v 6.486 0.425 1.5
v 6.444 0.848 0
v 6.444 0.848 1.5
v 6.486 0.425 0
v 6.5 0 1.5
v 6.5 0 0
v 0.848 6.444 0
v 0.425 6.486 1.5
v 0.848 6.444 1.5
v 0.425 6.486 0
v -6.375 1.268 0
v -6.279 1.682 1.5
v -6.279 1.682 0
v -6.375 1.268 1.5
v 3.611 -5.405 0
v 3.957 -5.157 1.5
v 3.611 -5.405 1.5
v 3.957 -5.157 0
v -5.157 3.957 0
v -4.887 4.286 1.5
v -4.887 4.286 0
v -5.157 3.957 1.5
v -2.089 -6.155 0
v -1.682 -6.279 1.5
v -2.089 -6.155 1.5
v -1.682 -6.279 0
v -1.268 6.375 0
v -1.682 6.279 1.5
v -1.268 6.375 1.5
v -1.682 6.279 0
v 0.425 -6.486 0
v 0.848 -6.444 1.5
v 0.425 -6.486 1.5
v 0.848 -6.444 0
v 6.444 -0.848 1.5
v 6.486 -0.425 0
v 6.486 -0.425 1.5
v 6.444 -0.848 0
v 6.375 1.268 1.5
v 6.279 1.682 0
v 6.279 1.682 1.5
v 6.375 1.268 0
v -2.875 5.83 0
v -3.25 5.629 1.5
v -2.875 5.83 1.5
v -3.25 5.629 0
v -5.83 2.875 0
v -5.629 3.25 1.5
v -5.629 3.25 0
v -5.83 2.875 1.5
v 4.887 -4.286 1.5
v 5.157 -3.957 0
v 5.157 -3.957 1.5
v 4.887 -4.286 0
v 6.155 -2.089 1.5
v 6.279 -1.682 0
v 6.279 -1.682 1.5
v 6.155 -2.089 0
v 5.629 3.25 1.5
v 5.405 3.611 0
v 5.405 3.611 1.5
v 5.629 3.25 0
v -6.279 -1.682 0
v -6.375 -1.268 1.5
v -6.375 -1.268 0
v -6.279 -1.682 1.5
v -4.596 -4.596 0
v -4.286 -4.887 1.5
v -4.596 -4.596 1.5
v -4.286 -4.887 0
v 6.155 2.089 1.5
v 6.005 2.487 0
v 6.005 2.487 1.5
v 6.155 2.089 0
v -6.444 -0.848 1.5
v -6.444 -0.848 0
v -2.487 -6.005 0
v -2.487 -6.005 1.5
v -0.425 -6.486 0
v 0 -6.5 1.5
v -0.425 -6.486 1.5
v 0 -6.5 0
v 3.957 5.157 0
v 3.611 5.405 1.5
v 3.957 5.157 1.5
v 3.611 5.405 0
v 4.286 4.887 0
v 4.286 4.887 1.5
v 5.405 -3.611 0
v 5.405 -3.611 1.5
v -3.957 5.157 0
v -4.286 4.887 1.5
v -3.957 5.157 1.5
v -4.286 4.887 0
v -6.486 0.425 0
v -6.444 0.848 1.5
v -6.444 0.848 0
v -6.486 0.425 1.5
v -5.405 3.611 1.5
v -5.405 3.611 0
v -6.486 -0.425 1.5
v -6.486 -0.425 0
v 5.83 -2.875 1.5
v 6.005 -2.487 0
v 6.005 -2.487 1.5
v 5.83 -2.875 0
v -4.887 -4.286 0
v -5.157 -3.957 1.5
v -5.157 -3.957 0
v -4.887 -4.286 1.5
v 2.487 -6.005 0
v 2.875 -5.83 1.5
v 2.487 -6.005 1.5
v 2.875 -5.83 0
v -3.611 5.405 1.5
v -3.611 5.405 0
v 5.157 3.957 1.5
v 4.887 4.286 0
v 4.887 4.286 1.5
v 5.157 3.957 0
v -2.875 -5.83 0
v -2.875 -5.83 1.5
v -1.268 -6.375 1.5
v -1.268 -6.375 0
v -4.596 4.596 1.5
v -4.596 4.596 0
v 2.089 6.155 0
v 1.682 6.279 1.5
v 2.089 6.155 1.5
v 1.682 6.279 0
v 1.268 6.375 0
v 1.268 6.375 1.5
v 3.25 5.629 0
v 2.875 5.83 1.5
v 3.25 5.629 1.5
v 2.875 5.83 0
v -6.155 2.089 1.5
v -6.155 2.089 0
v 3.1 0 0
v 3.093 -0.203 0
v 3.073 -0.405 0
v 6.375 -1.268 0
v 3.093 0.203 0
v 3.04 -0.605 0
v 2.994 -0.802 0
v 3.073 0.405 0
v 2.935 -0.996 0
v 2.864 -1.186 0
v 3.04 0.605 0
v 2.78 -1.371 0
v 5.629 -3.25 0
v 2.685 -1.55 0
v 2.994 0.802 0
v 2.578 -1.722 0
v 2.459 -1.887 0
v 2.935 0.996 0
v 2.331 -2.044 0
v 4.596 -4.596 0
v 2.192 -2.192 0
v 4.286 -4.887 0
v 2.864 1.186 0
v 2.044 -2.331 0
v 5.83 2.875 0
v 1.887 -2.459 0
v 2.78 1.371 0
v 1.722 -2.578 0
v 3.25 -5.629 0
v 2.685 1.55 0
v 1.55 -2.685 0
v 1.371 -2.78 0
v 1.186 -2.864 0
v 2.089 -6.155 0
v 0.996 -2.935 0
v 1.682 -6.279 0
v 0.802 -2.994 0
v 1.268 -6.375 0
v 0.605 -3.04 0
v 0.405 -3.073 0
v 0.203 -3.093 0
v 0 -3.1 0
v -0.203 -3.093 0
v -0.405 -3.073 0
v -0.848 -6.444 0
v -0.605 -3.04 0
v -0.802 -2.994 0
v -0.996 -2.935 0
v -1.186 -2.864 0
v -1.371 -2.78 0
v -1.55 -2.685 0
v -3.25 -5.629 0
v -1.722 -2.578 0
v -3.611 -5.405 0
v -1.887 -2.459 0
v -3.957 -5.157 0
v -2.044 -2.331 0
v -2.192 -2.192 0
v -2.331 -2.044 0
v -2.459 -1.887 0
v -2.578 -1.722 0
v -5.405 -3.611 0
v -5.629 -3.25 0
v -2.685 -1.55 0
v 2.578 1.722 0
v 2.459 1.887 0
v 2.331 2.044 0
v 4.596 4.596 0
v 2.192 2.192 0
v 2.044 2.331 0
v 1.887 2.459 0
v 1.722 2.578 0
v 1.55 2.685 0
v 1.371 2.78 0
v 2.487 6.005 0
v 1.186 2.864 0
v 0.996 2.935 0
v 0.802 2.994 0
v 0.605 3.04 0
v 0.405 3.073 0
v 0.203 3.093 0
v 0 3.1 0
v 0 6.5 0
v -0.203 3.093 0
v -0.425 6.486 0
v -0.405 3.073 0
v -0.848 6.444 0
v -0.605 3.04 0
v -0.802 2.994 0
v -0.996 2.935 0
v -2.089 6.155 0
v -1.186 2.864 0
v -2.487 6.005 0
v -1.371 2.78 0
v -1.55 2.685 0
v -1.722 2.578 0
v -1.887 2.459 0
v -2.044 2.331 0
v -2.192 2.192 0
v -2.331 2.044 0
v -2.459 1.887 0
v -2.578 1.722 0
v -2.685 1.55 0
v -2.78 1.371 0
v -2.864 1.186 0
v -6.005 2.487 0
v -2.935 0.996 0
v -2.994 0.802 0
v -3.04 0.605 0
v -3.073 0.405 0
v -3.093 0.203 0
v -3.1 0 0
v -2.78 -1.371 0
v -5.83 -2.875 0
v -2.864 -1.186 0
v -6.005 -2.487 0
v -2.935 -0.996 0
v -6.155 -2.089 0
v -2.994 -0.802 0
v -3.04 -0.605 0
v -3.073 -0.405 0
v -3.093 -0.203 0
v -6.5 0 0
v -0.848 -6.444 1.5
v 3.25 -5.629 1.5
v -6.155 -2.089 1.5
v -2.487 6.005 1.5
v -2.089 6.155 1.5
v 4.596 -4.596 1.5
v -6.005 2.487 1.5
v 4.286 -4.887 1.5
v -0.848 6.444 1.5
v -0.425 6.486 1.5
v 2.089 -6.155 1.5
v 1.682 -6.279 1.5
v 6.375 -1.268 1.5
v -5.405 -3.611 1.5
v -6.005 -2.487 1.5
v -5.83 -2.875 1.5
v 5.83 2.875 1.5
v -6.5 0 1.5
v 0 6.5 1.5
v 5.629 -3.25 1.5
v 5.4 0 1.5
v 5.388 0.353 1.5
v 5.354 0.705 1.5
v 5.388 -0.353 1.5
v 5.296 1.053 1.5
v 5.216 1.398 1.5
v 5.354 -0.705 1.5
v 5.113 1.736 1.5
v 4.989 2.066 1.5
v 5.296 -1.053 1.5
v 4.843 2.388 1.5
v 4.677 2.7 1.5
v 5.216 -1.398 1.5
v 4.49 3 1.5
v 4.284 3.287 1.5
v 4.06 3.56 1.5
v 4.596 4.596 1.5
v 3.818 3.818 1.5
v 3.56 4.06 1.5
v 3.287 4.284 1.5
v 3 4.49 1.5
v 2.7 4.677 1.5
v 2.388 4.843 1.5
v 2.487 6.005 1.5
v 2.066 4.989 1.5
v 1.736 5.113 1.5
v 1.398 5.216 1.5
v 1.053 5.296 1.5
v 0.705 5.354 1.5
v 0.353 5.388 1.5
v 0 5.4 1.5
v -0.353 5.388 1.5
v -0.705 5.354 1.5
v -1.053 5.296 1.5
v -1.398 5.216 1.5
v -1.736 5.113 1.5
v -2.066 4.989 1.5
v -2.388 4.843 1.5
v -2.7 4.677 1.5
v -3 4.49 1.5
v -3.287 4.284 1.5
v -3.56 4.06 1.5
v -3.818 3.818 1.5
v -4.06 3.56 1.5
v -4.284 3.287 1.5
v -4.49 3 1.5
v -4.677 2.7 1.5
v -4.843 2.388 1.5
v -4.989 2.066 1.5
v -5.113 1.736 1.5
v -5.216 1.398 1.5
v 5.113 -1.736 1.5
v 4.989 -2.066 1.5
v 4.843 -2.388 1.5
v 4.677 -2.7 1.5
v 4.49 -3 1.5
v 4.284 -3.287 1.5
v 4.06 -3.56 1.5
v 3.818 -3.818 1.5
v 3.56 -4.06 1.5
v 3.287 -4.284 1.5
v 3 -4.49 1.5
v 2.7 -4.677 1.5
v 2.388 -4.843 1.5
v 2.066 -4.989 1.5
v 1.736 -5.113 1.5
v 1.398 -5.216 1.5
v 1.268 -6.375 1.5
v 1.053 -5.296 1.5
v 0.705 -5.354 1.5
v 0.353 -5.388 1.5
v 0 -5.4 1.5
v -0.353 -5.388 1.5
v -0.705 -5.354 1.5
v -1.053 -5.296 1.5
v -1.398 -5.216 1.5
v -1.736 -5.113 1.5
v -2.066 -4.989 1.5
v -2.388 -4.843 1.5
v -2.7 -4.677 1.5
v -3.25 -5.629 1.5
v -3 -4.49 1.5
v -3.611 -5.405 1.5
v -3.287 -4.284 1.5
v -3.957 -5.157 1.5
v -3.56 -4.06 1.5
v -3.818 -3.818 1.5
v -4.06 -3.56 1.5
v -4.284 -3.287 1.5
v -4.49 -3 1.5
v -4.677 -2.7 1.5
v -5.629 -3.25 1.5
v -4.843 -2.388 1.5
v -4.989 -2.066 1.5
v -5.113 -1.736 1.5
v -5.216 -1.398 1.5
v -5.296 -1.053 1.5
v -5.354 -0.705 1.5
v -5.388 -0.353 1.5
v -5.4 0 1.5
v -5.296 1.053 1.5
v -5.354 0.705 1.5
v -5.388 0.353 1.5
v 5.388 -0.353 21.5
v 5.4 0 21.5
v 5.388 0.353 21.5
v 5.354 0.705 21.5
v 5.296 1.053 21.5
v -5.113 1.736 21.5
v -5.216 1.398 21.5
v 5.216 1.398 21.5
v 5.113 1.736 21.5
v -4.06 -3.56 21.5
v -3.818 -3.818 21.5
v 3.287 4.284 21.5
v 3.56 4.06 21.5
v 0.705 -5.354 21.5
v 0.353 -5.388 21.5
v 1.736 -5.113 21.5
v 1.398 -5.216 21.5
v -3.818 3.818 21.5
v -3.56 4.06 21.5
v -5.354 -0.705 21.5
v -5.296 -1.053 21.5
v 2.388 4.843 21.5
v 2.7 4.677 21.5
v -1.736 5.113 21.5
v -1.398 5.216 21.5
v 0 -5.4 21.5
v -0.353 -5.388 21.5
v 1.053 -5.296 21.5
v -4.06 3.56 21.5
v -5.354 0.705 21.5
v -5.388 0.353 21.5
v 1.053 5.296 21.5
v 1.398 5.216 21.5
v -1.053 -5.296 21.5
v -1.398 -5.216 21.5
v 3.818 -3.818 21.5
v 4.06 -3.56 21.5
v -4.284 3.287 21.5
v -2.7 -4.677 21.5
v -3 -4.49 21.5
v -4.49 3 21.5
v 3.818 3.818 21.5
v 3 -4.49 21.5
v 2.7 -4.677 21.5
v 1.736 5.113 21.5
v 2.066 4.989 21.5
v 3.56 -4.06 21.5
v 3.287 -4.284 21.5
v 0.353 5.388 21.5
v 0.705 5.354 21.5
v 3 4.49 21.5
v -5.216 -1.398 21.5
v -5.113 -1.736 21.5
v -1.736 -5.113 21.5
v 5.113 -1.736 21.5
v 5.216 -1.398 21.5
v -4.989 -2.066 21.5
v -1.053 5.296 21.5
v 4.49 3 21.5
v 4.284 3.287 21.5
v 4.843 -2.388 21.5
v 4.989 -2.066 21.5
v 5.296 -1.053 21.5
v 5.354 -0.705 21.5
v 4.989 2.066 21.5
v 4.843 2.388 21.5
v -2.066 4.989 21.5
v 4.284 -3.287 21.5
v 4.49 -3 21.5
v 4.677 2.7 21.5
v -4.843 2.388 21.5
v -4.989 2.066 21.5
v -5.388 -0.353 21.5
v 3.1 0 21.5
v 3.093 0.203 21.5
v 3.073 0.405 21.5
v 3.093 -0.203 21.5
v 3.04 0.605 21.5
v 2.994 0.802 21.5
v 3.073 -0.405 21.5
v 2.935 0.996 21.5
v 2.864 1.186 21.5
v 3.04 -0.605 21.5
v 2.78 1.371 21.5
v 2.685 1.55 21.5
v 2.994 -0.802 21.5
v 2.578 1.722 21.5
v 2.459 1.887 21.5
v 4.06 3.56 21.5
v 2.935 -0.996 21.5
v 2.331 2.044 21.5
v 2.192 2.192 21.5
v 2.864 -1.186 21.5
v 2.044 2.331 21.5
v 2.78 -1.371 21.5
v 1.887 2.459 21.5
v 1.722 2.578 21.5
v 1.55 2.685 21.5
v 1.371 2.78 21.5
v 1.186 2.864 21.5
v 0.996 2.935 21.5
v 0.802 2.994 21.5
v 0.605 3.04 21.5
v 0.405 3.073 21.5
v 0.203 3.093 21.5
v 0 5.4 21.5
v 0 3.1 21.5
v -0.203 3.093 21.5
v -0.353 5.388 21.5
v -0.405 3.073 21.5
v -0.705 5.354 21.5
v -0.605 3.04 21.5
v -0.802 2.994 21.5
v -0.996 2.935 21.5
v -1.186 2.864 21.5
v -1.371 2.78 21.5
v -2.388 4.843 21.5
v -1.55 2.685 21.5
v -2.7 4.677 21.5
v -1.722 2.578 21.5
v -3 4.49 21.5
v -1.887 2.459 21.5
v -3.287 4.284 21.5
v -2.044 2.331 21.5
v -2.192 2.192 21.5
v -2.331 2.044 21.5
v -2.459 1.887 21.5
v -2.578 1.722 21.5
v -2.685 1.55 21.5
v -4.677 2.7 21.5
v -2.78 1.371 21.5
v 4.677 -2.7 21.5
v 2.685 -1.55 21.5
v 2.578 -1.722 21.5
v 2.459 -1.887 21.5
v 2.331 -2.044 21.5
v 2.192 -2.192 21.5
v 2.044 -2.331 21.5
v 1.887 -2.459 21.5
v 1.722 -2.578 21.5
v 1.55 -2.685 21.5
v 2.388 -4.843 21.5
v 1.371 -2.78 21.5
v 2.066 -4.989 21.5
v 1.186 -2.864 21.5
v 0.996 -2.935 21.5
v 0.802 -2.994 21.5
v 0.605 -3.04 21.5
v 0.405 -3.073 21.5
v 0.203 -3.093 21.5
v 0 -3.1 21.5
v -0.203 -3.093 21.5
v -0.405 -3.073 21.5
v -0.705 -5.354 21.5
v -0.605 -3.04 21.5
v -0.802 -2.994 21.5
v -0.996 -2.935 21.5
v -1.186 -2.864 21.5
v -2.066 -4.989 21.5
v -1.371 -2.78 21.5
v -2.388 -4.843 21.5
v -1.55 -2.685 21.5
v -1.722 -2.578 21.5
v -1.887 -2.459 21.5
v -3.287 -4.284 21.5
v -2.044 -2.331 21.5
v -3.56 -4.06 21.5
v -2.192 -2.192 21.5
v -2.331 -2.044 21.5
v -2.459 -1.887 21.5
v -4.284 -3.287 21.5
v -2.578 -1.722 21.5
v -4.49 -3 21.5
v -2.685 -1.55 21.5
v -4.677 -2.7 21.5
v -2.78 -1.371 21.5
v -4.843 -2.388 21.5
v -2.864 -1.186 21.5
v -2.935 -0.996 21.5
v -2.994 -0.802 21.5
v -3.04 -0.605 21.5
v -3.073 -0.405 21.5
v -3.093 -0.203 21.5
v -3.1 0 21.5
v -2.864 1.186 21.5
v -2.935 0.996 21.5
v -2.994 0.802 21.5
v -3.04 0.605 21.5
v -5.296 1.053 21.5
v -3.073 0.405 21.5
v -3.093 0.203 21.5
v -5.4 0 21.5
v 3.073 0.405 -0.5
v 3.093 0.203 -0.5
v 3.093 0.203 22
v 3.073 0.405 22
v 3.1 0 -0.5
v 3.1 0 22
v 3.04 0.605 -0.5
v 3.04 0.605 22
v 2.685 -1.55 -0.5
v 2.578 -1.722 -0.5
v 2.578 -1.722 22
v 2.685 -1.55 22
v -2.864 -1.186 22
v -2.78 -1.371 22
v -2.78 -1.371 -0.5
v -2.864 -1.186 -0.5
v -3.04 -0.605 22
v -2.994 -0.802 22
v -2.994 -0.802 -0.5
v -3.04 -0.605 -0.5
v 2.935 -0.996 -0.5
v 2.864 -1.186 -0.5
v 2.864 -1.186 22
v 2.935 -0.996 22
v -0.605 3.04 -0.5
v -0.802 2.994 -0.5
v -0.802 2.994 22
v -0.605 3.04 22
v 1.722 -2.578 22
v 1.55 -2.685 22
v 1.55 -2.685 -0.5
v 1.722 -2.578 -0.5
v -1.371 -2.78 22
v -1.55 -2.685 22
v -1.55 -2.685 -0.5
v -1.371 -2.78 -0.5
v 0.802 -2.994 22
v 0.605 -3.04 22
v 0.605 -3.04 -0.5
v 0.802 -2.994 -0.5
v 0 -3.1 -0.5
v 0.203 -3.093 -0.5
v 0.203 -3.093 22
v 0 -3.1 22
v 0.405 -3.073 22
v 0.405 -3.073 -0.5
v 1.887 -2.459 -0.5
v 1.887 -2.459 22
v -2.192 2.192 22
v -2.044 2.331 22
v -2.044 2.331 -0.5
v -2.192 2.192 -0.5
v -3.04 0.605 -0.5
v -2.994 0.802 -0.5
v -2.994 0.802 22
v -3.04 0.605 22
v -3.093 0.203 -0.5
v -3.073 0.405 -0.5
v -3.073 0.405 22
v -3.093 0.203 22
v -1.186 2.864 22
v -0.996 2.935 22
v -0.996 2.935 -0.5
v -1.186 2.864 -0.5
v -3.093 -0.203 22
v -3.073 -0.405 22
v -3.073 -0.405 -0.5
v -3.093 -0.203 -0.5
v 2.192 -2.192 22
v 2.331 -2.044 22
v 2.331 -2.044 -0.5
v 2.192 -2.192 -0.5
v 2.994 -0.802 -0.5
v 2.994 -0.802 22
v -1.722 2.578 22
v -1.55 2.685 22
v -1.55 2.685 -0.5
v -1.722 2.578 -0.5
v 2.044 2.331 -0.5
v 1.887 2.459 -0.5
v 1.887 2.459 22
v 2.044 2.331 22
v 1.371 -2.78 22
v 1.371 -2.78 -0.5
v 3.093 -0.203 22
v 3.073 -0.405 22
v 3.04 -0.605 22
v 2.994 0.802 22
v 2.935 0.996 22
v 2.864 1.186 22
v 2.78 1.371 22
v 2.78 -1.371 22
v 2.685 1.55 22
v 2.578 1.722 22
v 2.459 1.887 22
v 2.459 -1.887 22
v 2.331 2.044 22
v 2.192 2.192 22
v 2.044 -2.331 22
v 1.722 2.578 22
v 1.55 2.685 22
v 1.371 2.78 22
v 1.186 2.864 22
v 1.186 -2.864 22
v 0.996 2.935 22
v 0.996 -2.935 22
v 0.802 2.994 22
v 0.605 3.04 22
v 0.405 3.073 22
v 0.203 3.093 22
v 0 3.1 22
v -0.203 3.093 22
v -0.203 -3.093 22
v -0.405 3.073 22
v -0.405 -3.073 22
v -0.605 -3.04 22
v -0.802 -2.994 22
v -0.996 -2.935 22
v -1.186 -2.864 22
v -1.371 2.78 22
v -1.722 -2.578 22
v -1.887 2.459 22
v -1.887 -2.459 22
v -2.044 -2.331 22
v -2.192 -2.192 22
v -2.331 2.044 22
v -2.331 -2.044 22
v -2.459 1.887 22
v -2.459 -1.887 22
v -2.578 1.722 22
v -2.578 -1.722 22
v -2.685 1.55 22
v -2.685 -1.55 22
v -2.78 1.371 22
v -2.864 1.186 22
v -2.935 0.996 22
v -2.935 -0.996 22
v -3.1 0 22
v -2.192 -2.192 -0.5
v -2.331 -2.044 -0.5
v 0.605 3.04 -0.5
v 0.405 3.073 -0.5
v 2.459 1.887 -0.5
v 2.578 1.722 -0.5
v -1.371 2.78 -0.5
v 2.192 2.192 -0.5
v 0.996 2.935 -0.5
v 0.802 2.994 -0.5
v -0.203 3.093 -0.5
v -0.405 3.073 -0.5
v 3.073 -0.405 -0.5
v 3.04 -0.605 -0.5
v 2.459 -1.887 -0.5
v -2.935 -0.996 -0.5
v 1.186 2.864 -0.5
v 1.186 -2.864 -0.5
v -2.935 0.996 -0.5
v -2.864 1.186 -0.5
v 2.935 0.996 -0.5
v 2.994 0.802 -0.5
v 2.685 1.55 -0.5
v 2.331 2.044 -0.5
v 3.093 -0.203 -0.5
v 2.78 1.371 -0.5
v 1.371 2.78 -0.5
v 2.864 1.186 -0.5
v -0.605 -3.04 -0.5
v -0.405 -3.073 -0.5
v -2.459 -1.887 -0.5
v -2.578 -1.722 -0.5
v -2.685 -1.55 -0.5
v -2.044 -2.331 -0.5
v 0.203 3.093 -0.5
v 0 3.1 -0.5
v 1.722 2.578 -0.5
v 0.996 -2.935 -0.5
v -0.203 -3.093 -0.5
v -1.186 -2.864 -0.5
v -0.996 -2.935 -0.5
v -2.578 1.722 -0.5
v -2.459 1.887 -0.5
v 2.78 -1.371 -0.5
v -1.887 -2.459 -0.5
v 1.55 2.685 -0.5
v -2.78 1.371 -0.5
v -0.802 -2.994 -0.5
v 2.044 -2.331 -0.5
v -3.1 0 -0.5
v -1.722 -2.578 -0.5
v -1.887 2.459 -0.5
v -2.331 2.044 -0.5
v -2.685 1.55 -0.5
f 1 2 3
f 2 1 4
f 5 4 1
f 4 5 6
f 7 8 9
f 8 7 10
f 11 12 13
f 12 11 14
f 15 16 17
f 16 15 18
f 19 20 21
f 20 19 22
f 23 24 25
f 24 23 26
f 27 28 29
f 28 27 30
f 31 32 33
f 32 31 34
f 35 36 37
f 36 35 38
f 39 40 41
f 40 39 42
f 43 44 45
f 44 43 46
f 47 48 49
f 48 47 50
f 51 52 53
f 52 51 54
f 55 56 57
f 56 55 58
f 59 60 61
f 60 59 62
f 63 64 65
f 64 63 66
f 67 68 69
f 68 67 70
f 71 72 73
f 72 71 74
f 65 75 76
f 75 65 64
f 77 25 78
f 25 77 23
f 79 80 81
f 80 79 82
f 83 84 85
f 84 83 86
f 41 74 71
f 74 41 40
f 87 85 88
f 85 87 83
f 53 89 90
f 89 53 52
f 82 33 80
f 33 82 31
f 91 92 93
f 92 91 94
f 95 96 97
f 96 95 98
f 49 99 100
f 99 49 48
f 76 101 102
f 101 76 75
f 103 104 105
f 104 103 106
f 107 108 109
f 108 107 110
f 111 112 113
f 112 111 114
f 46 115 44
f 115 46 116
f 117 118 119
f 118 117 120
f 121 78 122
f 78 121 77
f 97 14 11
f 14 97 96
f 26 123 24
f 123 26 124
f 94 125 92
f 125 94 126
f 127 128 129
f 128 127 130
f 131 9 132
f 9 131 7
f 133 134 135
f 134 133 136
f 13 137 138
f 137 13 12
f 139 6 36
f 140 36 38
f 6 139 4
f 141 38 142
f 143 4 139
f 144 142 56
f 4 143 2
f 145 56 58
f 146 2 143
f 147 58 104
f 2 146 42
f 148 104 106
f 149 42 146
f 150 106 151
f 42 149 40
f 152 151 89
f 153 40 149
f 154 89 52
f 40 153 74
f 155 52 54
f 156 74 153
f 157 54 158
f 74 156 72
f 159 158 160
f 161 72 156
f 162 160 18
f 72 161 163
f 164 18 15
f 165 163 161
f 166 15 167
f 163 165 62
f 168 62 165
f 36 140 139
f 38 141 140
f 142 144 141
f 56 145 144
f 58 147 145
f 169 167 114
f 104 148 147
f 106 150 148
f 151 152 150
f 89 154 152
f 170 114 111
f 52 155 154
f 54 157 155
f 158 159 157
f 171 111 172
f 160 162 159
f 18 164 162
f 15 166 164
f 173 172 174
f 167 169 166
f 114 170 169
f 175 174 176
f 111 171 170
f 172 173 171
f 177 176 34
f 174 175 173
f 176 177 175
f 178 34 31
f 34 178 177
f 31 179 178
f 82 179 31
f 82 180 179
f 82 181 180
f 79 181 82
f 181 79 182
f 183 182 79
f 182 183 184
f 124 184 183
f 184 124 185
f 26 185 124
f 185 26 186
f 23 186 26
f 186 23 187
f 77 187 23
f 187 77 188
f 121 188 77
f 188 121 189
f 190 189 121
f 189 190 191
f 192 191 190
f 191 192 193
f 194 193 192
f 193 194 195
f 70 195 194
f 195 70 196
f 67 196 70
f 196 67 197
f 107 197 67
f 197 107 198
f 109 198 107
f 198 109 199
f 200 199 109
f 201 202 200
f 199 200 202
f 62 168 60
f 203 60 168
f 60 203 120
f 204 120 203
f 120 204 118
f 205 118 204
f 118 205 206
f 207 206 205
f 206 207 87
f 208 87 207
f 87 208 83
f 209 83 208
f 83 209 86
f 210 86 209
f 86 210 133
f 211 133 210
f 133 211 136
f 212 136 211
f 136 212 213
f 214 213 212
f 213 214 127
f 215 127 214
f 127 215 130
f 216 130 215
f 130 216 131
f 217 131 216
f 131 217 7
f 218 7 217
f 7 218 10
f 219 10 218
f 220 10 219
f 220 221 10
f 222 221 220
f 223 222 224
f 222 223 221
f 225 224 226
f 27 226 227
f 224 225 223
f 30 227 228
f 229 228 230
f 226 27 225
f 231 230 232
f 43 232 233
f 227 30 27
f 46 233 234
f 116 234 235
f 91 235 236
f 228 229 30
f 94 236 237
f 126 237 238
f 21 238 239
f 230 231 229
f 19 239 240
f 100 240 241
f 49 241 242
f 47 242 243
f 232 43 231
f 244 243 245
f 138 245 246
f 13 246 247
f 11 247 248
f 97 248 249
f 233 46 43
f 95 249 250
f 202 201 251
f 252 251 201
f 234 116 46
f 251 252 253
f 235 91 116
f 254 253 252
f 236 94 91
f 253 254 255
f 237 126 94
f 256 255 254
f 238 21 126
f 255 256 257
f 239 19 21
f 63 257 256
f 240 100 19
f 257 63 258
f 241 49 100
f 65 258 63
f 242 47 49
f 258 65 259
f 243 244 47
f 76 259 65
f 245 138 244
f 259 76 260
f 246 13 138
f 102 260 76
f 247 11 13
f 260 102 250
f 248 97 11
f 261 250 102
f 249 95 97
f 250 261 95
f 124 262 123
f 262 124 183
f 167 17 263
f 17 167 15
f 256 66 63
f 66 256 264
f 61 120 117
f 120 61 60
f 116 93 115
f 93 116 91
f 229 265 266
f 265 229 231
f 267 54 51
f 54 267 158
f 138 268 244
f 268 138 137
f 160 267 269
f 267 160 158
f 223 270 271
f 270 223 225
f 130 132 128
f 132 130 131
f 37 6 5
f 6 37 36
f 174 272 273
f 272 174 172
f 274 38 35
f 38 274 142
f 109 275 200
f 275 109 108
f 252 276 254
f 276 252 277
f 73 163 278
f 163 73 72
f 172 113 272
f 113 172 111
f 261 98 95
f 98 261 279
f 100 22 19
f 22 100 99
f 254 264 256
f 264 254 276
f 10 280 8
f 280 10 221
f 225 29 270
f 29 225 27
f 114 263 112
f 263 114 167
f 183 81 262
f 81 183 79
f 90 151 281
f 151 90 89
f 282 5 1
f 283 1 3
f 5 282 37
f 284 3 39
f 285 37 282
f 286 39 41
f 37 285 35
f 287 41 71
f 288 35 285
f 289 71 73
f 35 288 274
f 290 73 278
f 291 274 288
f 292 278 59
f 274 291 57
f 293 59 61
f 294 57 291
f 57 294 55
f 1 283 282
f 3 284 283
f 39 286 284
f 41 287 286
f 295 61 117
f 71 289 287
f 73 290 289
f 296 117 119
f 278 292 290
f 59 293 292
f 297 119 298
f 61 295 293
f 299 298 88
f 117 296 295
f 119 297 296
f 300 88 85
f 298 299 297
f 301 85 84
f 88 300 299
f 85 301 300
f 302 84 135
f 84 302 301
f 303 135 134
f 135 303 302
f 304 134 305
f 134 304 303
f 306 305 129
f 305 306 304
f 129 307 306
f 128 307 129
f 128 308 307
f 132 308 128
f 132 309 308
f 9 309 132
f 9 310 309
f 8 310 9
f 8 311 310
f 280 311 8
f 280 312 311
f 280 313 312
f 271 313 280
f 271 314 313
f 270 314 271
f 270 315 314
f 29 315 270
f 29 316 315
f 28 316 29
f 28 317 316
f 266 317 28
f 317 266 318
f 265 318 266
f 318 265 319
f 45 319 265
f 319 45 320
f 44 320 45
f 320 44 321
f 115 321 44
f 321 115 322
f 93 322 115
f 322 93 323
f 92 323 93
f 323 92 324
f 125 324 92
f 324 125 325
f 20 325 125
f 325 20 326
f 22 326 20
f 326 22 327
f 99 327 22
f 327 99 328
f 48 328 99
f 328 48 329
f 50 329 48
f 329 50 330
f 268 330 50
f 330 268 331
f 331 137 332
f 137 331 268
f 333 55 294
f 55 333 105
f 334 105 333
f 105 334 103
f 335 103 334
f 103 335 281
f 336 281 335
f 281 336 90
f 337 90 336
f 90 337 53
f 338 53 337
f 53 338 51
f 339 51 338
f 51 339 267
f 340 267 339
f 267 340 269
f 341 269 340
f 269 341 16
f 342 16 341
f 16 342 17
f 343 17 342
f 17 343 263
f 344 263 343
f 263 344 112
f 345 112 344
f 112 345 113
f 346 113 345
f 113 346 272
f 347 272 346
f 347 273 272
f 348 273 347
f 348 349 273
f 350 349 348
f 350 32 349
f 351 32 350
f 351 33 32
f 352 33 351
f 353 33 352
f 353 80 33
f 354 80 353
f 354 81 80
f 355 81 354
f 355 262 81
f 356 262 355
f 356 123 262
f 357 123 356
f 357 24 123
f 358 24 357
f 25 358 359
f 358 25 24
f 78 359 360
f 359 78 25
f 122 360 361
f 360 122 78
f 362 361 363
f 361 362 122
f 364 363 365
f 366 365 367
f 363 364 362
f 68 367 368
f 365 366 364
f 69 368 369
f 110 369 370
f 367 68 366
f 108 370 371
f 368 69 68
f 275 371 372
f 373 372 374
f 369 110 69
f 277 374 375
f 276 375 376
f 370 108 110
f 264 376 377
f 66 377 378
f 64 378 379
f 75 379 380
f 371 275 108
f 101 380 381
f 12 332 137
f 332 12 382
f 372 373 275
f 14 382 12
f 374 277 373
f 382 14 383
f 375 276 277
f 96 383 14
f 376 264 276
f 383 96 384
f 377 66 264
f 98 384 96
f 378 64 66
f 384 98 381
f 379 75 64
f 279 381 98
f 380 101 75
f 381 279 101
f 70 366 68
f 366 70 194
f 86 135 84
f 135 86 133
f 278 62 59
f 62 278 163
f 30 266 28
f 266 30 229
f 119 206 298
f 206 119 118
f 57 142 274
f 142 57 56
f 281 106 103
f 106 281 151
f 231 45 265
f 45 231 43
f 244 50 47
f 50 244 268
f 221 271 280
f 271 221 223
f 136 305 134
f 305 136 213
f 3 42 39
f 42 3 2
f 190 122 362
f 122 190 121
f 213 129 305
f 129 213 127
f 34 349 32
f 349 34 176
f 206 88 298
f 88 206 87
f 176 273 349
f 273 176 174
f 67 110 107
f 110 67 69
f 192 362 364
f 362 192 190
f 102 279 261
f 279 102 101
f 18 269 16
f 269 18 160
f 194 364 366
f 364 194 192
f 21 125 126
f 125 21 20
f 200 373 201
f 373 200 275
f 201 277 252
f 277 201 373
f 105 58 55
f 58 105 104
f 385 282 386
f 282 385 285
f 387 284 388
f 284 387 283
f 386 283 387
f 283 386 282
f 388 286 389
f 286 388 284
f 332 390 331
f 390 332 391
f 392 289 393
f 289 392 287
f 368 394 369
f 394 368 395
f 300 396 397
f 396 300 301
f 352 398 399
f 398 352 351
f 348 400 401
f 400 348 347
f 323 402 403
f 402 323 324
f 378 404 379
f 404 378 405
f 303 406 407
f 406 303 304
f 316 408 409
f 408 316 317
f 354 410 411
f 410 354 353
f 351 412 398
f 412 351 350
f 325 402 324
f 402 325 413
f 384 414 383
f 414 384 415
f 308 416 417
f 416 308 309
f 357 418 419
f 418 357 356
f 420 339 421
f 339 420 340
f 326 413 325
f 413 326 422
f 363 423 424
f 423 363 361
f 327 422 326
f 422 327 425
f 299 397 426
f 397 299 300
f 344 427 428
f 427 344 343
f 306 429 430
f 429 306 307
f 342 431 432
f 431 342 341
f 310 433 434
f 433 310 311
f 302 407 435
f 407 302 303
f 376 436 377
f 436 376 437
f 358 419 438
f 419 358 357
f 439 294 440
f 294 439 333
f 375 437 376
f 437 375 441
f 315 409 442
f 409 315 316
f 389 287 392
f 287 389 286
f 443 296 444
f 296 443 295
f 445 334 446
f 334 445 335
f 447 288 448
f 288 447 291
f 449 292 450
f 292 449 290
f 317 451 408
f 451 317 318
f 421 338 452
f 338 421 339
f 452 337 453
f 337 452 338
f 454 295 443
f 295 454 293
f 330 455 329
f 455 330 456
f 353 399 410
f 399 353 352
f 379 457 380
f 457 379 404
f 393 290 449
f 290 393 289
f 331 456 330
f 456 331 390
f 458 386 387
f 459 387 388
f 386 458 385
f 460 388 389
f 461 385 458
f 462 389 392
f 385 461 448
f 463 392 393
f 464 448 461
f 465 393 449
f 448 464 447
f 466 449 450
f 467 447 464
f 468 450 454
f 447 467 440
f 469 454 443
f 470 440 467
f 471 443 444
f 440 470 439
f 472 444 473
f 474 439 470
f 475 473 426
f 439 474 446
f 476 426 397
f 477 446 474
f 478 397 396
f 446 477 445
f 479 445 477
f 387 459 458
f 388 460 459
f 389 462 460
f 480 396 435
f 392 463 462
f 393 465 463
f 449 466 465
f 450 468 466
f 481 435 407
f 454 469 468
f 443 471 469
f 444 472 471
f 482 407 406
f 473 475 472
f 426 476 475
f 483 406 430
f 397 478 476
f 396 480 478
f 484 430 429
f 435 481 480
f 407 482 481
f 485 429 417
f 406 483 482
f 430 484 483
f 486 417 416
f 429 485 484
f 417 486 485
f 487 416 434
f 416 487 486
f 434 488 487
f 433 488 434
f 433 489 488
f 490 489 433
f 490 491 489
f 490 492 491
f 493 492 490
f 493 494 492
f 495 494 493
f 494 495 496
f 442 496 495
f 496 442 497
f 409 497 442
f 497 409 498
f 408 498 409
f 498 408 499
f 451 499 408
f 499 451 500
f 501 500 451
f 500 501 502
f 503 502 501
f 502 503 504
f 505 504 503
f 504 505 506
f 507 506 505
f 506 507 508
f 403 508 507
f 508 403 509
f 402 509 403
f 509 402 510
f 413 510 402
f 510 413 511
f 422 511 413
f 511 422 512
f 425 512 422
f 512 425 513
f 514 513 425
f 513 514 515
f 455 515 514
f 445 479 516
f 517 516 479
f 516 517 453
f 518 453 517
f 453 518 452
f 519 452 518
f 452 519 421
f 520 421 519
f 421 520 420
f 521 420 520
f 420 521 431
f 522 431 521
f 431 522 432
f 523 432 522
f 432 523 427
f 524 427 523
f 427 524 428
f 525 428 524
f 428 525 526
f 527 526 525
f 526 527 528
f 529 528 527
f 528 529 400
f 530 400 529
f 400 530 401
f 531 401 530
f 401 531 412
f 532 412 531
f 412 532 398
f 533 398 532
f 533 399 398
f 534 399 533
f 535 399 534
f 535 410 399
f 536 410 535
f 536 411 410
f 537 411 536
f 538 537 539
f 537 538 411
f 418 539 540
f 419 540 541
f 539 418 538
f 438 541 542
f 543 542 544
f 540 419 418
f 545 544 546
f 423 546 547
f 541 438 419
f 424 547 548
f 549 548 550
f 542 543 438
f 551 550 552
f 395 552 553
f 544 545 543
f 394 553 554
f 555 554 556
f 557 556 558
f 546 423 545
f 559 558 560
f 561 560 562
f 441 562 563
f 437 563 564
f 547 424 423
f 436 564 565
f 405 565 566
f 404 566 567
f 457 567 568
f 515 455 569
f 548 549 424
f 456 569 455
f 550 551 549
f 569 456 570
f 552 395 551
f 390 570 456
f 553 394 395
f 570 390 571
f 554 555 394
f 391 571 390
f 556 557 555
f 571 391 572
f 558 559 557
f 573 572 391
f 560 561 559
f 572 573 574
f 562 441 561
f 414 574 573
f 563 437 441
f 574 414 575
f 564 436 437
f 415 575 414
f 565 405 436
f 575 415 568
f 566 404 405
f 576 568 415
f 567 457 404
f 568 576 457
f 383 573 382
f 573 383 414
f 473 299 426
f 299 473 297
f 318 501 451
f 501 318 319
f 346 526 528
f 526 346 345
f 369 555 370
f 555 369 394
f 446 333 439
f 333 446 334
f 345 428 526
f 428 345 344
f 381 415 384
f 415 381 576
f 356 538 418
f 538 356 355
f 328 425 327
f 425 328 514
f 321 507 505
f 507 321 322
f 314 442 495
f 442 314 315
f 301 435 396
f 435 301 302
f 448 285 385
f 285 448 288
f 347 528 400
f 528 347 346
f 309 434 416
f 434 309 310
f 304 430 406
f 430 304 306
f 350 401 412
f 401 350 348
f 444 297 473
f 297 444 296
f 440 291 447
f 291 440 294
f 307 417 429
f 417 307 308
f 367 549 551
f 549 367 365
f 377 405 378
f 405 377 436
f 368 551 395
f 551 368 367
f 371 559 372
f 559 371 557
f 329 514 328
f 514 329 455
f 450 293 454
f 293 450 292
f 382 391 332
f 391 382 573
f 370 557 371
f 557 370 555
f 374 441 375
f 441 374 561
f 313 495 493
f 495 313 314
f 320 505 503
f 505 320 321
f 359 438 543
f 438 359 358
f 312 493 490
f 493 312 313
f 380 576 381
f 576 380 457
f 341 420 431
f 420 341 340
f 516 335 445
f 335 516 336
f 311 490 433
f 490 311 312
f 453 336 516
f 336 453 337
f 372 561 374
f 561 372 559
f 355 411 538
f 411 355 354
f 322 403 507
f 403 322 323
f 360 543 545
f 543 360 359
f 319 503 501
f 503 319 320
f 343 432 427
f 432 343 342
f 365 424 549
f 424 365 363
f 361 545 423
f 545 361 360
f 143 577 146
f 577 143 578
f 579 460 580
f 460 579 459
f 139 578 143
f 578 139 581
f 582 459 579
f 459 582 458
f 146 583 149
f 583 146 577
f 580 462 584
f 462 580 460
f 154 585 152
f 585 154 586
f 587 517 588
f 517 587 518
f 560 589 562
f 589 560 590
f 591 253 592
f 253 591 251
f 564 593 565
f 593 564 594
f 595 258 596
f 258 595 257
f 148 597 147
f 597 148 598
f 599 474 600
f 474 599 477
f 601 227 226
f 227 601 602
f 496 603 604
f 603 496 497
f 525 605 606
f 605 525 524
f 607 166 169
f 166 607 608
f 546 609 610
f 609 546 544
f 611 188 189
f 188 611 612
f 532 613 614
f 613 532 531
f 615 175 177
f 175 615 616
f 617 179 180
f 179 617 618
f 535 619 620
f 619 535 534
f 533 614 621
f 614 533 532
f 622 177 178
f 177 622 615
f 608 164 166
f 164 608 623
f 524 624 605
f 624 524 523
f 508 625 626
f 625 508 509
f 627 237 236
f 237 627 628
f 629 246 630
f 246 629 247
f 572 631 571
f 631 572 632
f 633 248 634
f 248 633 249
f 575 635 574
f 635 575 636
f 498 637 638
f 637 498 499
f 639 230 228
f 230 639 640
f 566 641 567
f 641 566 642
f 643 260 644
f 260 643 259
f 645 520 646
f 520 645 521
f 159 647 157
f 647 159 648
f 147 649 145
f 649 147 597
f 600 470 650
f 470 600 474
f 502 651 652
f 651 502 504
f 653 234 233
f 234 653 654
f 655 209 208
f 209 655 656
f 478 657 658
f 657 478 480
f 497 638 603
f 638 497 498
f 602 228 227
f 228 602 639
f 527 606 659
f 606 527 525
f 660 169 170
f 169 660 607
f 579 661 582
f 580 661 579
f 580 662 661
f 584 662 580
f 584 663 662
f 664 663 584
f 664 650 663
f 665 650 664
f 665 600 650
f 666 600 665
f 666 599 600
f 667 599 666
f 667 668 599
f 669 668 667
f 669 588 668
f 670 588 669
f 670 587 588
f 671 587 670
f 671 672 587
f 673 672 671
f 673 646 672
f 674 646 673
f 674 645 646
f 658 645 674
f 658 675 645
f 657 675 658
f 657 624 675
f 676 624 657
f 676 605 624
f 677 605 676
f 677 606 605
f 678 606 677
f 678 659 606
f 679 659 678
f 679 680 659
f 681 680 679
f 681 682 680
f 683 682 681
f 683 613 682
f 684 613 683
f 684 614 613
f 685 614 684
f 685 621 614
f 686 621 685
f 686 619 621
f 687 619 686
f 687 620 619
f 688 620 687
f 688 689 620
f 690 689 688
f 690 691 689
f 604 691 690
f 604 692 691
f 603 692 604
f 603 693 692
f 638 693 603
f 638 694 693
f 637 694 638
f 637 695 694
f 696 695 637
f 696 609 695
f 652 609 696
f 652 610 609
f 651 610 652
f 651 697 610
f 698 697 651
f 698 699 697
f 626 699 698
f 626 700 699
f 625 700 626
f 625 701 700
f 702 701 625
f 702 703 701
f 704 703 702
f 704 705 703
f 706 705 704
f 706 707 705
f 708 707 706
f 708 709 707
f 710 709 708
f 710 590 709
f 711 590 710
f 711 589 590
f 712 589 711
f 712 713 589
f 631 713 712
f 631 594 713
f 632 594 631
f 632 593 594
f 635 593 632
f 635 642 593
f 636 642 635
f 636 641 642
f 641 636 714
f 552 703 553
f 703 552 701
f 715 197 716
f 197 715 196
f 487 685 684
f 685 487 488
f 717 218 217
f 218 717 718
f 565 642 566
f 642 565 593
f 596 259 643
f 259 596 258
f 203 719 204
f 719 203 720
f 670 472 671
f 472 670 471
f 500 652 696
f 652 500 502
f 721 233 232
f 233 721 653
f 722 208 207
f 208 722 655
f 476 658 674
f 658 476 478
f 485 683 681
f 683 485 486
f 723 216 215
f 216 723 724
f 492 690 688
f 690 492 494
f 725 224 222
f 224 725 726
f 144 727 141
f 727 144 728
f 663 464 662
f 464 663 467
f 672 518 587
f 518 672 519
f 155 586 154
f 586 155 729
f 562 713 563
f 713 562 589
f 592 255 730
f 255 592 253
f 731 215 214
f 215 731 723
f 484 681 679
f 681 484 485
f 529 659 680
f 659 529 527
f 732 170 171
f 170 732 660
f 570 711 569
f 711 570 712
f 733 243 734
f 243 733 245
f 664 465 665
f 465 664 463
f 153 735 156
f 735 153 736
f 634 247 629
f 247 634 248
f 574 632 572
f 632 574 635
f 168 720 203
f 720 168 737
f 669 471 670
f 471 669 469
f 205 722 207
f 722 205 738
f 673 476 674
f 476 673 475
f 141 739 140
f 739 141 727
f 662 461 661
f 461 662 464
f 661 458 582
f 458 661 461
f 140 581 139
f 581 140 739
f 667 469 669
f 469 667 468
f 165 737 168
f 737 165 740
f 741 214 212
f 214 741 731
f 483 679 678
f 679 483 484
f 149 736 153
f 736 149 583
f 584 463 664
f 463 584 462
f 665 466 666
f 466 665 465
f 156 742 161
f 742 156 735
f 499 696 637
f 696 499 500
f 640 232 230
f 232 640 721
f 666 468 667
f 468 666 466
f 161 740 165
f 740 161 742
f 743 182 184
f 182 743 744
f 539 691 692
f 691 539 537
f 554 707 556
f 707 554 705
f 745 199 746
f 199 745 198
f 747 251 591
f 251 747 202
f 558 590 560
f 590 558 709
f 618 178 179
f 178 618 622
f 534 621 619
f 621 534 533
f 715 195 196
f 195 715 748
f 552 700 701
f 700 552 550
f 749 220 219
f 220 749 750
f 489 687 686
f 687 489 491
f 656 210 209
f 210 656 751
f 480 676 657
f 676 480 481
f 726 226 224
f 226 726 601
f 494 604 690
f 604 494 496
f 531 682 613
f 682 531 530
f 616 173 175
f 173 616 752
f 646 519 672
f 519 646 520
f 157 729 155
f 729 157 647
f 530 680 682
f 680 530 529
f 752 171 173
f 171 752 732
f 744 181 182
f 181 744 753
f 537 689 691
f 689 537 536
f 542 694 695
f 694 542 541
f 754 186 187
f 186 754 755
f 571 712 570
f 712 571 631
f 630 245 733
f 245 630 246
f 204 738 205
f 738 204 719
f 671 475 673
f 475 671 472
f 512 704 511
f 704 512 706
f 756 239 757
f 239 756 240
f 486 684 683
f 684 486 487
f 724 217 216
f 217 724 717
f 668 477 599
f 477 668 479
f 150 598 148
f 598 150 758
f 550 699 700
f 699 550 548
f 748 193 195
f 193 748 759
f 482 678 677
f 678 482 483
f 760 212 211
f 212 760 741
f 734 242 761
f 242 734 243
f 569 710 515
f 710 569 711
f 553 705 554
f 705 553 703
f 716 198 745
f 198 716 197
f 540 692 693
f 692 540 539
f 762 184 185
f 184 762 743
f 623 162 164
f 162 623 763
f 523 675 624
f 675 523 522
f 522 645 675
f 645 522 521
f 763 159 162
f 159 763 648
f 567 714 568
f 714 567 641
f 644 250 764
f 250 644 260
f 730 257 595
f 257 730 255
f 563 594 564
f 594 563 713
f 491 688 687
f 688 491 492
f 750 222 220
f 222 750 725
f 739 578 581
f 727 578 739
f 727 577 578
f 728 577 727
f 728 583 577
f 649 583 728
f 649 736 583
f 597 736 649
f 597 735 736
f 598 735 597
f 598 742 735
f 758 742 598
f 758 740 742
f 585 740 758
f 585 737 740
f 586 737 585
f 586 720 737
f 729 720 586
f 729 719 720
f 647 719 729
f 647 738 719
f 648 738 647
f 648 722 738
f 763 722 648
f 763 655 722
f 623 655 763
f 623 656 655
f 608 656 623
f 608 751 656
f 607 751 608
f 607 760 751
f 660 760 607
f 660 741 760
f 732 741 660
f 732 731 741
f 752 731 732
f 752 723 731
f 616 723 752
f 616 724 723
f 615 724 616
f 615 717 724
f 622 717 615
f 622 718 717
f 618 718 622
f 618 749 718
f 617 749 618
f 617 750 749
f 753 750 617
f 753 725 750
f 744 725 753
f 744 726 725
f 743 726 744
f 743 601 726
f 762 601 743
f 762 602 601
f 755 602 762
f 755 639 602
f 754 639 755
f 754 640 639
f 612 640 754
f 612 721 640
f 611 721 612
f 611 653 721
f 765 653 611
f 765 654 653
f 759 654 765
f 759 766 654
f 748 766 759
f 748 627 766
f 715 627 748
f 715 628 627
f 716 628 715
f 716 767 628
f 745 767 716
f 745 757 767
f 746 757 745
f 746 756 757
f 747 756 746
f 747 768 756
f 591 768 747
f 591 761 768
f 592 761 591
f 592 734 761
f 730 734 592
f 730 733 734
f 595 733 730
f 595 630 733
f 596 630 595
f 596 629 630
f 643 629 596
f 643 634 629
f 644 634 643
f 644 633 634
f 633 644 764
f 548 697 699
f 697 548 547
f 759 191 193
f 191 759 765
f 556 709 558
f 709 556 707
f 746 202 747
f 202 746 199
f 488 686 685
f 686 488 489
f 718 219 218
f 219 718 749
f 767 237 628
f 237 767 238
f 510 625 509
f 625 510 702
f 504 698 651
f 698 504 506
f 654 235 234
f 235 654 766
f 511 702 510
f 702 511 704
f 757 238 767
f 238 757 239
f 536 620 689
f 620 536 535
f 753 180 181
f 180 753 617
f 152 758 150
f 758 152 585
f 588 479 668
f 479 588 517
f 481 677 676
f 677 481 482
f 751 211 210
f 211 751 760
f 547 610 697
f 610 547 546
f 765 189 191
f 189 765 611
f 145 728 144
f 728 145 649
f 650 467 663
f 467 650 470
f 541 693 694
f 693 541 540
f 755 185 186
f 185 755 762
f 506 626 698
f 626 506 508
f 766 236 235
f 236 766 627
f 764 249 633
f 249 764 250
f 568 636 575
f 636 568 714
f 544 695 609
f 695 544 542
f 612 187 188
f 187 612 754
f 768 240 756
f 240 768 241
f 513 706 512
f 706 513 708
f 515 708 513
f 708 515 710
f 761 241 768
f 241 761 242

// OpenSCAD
// PCR tube adapter sleeve: fits a 0.2 mL tube into a 1.5 mL rack hole
// Print orientation: collar on the bed (z = 0), sleeve body builds upward

// ---------- Parameters ----------
collar_d        = 13;     // collar outer diameter
collar_t        = 1.5;    // collar thickness (z = 0 to 1.5)
sleeve_d        = 10.8;   // sleeve body outer diameter
sleeve_h        = 20;     // sleeve body height above collar (z = 1.5 to 21.5)
bore_d          = 6.2;    // through-bore diameter
eps             = 0.5;    // cutter overshoot past faces
$fn             = 96;     // curve resolution

// ---------- Model ----------
union() {
    // Collar lying on the bed
    cylinder(d = collar_d, h = collar_t);

    // Sleeve body rising from the collar top
    translate([0, 0, collar_t])
        cylinder(d = sleeve_d, h = sleeve_h);
}

// Full-height bore, open at both ends
translate([0, 0, -eps])
    cylinder(d = bore_d, h = sleeve_h + collar_t + 2 * eps);
